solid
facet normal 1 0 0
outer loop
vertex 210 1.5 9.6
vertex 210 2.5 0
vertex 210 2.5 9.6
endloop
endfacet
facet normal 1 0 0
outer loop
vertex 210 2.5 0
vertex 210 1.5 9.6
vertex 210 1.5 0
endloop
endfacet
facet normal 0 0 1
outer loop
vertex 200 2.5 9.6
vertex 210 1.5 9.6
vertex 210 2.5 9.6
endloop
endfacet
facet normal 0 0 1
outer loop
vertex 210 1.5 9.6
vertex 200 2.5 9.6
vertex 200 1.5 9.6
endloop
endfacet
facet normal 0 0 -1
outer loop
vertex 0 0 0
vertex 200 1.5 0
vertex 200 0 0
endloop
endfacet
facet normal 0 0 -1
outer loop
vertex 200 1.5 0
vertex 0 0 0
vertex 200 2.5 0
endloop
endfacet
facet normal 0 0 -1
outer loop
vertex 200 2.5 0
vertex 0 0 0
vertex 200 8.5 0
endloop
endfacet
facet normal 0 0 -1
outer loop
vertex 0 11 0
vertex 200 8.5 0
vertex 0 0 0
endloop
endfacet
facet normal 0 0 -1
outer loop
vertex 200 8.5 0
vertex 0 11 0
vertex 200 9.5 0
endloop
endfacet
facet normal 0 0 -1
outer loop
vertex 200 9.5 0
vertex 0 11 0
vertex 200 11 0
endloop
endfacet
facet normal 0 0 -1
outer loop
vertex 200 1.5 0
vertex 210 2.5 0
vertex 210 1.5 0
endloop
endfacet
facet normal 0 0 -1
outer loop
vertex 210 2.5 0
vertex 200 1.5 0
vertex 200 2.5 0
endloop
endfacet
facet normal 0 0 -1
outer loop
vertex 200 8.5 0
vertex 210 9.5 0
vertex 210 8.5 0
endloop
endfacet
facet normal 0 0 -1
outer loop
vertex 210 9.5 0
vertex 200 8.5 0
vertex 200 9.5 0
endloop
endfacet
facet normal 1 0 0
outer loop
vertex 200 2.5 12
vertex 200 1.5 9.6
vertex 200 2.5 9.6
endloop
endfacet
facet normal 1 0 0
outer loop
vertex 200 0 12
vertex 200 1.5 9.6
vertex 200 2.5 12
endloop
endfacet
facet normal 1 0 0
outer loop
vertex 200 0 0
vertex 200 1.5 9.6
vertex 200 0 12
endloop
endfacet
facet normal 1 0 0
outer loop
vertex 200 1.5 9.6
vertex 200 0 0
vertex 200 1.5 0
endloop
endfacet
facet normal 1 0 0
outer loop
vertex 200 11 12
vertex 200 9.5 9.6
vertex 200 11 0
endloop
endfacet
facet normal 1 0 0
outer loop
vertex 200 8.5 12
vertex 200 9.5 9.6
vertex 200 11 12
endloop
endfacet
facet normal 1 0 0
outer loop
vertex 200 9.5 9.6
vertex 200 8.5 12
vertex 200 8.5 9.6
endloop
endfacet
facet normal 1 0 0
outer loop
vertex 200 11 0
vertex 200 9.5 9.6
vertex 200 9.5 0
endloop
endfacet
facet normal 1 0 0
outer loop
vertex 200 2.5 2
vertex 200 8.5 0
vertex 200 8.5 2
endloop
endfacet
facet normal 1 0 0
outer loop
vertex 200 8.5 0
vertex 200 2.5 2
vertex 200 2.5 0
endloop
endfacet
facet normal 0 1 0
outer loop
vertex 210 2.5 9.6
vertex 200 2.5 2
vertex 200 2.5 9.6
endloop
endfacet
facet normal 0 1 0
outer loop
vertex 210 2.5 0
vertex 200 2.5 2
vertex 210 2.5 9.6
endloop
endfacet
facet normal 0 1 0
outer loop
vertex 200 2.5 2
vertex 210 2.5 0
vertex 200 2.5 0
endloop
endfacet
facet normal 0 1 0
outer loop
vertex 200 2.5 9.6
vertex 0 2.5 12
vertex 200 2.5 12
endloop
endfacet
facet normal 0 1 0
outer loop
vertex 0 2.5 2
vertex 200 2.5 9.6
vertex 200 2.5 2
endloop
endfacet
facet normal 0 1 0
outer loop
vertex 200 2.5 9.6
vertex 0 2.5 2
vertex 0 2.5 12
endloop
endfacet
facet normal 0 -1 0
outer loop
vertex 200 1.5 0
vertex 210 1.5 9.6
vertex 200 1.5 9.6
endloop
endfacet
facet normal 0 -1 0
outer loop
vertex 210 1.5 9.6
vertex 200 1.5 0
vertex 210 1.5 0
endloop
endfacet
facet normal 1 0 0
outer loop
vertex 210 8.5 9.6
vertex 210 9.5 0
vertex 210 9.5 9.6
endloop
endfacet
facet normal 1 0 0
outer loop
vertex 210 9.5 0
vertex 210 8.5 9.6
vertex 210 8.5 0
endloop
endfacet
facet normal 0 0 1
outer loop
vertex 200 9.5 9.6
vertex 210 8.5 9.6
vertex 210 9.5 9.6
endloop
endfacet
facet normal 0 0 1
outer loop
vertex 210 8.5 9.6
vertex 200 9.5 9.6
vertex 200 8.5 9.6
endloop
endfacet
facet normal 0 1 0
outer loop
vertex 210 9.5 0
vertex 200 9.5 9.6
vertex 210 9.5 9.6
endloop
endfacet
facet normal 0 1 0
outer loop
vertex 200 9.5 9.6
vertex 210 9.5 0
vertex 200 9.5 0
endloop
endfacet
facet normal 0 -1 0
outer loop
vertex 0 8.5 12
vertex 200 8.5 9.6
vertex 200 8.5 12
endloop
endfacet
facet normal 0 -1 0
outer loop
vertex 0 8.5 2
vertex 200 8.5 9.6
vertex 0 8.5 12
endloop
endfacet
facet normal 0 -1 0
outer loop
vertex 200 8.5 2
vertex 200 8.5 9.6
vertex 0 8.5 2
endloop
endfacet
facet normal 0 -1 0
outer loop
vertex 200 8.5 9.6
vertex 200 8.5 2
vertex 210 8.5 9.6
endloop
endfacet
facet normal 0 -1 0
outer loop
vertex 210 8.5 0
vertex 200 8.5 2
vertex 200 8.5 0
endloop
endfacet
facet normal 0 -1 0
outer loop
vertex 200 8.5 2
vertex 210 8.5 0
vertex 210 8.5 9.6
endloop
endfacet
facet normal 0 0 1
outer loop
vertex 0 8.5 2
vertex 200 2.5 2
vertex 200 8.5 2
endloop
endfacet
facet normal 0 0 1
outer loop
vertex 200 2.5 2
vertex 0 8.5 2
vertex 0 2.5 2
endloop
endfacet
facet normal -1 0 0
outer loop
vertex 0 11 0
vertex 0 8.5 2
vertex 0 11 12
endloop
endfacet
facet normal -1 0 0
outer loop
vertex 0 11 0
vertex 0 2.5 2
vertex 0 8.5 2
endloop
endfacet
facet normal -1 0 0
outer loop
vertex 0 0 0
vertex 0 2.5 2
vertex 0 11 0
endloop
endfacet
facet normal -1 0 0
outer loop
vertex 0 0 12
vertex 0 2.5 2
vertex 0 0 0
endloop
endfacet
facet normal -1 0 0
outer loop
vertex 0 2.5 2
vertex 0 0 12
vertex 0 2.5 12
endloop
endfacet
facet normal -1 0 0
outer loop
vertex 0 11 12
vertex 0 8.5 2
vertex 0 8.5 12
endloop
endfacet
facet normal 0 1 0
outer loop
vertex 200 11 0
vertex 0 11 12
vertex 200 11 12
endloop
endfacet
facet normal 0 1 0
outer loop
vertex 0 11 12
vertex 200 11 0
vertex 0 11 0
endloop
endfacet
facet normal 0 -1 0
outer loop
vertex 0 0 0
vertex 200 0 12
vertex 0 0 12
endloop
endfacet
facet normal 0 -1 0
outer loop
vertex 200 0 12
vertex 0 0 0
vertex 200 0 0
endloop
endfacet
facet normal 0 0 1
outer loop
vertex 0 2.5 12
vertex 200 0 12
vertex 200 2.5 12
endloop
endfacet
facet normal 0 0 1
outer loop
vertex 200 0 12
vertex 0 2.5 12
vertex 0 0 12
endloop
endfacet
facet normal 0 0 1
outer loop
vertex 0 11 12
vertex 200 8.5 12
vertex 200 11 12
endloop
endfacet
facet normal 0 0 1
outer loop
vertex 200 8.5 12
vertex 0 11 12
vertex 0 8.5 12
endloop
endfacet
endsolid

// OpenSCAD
$fn = 100; 
l = 200; // length
h = 12;
type = "r"; // l = left; m = middle; r = right

module rail() {
    difference() {
        union() {
            cube([l, 11, 2]);

            // Vordere Schiene
            color("green")
            translate([0, 0, 0])
            cube([l, 2.5, h]);

            // Hintere Schiene
            color("green")
            translate([0, 8.5, 0])
            cube([l, 2.5, h]);

            if(type == "r" || type == "m") {
                // Stutzen vorne
                color("cyan")
                translate([l, 1.5, 0])
                cube([10, 1, h-2.4]);

                // Stutzen hinten
                color("cyan")
                translate([l, 8.5, 0])
                cube([10, 1, h-2.4]);
            }
        }

        if(type == "l" || type == "m") {
            // Ausschnitt links vorne
            color("red")
            translate([-1, 1.3, -1])
            cube([12, 1.4, h + 1 - 2]);

            // Ausschnitt links hinten
            color("red")
            translate([-1, 8.3, -1])
            cube([12, 1.4, h + 1 - 2]);
        }
    }
}

rail();
// translate([l + 10, 0, 0])
// rail();
